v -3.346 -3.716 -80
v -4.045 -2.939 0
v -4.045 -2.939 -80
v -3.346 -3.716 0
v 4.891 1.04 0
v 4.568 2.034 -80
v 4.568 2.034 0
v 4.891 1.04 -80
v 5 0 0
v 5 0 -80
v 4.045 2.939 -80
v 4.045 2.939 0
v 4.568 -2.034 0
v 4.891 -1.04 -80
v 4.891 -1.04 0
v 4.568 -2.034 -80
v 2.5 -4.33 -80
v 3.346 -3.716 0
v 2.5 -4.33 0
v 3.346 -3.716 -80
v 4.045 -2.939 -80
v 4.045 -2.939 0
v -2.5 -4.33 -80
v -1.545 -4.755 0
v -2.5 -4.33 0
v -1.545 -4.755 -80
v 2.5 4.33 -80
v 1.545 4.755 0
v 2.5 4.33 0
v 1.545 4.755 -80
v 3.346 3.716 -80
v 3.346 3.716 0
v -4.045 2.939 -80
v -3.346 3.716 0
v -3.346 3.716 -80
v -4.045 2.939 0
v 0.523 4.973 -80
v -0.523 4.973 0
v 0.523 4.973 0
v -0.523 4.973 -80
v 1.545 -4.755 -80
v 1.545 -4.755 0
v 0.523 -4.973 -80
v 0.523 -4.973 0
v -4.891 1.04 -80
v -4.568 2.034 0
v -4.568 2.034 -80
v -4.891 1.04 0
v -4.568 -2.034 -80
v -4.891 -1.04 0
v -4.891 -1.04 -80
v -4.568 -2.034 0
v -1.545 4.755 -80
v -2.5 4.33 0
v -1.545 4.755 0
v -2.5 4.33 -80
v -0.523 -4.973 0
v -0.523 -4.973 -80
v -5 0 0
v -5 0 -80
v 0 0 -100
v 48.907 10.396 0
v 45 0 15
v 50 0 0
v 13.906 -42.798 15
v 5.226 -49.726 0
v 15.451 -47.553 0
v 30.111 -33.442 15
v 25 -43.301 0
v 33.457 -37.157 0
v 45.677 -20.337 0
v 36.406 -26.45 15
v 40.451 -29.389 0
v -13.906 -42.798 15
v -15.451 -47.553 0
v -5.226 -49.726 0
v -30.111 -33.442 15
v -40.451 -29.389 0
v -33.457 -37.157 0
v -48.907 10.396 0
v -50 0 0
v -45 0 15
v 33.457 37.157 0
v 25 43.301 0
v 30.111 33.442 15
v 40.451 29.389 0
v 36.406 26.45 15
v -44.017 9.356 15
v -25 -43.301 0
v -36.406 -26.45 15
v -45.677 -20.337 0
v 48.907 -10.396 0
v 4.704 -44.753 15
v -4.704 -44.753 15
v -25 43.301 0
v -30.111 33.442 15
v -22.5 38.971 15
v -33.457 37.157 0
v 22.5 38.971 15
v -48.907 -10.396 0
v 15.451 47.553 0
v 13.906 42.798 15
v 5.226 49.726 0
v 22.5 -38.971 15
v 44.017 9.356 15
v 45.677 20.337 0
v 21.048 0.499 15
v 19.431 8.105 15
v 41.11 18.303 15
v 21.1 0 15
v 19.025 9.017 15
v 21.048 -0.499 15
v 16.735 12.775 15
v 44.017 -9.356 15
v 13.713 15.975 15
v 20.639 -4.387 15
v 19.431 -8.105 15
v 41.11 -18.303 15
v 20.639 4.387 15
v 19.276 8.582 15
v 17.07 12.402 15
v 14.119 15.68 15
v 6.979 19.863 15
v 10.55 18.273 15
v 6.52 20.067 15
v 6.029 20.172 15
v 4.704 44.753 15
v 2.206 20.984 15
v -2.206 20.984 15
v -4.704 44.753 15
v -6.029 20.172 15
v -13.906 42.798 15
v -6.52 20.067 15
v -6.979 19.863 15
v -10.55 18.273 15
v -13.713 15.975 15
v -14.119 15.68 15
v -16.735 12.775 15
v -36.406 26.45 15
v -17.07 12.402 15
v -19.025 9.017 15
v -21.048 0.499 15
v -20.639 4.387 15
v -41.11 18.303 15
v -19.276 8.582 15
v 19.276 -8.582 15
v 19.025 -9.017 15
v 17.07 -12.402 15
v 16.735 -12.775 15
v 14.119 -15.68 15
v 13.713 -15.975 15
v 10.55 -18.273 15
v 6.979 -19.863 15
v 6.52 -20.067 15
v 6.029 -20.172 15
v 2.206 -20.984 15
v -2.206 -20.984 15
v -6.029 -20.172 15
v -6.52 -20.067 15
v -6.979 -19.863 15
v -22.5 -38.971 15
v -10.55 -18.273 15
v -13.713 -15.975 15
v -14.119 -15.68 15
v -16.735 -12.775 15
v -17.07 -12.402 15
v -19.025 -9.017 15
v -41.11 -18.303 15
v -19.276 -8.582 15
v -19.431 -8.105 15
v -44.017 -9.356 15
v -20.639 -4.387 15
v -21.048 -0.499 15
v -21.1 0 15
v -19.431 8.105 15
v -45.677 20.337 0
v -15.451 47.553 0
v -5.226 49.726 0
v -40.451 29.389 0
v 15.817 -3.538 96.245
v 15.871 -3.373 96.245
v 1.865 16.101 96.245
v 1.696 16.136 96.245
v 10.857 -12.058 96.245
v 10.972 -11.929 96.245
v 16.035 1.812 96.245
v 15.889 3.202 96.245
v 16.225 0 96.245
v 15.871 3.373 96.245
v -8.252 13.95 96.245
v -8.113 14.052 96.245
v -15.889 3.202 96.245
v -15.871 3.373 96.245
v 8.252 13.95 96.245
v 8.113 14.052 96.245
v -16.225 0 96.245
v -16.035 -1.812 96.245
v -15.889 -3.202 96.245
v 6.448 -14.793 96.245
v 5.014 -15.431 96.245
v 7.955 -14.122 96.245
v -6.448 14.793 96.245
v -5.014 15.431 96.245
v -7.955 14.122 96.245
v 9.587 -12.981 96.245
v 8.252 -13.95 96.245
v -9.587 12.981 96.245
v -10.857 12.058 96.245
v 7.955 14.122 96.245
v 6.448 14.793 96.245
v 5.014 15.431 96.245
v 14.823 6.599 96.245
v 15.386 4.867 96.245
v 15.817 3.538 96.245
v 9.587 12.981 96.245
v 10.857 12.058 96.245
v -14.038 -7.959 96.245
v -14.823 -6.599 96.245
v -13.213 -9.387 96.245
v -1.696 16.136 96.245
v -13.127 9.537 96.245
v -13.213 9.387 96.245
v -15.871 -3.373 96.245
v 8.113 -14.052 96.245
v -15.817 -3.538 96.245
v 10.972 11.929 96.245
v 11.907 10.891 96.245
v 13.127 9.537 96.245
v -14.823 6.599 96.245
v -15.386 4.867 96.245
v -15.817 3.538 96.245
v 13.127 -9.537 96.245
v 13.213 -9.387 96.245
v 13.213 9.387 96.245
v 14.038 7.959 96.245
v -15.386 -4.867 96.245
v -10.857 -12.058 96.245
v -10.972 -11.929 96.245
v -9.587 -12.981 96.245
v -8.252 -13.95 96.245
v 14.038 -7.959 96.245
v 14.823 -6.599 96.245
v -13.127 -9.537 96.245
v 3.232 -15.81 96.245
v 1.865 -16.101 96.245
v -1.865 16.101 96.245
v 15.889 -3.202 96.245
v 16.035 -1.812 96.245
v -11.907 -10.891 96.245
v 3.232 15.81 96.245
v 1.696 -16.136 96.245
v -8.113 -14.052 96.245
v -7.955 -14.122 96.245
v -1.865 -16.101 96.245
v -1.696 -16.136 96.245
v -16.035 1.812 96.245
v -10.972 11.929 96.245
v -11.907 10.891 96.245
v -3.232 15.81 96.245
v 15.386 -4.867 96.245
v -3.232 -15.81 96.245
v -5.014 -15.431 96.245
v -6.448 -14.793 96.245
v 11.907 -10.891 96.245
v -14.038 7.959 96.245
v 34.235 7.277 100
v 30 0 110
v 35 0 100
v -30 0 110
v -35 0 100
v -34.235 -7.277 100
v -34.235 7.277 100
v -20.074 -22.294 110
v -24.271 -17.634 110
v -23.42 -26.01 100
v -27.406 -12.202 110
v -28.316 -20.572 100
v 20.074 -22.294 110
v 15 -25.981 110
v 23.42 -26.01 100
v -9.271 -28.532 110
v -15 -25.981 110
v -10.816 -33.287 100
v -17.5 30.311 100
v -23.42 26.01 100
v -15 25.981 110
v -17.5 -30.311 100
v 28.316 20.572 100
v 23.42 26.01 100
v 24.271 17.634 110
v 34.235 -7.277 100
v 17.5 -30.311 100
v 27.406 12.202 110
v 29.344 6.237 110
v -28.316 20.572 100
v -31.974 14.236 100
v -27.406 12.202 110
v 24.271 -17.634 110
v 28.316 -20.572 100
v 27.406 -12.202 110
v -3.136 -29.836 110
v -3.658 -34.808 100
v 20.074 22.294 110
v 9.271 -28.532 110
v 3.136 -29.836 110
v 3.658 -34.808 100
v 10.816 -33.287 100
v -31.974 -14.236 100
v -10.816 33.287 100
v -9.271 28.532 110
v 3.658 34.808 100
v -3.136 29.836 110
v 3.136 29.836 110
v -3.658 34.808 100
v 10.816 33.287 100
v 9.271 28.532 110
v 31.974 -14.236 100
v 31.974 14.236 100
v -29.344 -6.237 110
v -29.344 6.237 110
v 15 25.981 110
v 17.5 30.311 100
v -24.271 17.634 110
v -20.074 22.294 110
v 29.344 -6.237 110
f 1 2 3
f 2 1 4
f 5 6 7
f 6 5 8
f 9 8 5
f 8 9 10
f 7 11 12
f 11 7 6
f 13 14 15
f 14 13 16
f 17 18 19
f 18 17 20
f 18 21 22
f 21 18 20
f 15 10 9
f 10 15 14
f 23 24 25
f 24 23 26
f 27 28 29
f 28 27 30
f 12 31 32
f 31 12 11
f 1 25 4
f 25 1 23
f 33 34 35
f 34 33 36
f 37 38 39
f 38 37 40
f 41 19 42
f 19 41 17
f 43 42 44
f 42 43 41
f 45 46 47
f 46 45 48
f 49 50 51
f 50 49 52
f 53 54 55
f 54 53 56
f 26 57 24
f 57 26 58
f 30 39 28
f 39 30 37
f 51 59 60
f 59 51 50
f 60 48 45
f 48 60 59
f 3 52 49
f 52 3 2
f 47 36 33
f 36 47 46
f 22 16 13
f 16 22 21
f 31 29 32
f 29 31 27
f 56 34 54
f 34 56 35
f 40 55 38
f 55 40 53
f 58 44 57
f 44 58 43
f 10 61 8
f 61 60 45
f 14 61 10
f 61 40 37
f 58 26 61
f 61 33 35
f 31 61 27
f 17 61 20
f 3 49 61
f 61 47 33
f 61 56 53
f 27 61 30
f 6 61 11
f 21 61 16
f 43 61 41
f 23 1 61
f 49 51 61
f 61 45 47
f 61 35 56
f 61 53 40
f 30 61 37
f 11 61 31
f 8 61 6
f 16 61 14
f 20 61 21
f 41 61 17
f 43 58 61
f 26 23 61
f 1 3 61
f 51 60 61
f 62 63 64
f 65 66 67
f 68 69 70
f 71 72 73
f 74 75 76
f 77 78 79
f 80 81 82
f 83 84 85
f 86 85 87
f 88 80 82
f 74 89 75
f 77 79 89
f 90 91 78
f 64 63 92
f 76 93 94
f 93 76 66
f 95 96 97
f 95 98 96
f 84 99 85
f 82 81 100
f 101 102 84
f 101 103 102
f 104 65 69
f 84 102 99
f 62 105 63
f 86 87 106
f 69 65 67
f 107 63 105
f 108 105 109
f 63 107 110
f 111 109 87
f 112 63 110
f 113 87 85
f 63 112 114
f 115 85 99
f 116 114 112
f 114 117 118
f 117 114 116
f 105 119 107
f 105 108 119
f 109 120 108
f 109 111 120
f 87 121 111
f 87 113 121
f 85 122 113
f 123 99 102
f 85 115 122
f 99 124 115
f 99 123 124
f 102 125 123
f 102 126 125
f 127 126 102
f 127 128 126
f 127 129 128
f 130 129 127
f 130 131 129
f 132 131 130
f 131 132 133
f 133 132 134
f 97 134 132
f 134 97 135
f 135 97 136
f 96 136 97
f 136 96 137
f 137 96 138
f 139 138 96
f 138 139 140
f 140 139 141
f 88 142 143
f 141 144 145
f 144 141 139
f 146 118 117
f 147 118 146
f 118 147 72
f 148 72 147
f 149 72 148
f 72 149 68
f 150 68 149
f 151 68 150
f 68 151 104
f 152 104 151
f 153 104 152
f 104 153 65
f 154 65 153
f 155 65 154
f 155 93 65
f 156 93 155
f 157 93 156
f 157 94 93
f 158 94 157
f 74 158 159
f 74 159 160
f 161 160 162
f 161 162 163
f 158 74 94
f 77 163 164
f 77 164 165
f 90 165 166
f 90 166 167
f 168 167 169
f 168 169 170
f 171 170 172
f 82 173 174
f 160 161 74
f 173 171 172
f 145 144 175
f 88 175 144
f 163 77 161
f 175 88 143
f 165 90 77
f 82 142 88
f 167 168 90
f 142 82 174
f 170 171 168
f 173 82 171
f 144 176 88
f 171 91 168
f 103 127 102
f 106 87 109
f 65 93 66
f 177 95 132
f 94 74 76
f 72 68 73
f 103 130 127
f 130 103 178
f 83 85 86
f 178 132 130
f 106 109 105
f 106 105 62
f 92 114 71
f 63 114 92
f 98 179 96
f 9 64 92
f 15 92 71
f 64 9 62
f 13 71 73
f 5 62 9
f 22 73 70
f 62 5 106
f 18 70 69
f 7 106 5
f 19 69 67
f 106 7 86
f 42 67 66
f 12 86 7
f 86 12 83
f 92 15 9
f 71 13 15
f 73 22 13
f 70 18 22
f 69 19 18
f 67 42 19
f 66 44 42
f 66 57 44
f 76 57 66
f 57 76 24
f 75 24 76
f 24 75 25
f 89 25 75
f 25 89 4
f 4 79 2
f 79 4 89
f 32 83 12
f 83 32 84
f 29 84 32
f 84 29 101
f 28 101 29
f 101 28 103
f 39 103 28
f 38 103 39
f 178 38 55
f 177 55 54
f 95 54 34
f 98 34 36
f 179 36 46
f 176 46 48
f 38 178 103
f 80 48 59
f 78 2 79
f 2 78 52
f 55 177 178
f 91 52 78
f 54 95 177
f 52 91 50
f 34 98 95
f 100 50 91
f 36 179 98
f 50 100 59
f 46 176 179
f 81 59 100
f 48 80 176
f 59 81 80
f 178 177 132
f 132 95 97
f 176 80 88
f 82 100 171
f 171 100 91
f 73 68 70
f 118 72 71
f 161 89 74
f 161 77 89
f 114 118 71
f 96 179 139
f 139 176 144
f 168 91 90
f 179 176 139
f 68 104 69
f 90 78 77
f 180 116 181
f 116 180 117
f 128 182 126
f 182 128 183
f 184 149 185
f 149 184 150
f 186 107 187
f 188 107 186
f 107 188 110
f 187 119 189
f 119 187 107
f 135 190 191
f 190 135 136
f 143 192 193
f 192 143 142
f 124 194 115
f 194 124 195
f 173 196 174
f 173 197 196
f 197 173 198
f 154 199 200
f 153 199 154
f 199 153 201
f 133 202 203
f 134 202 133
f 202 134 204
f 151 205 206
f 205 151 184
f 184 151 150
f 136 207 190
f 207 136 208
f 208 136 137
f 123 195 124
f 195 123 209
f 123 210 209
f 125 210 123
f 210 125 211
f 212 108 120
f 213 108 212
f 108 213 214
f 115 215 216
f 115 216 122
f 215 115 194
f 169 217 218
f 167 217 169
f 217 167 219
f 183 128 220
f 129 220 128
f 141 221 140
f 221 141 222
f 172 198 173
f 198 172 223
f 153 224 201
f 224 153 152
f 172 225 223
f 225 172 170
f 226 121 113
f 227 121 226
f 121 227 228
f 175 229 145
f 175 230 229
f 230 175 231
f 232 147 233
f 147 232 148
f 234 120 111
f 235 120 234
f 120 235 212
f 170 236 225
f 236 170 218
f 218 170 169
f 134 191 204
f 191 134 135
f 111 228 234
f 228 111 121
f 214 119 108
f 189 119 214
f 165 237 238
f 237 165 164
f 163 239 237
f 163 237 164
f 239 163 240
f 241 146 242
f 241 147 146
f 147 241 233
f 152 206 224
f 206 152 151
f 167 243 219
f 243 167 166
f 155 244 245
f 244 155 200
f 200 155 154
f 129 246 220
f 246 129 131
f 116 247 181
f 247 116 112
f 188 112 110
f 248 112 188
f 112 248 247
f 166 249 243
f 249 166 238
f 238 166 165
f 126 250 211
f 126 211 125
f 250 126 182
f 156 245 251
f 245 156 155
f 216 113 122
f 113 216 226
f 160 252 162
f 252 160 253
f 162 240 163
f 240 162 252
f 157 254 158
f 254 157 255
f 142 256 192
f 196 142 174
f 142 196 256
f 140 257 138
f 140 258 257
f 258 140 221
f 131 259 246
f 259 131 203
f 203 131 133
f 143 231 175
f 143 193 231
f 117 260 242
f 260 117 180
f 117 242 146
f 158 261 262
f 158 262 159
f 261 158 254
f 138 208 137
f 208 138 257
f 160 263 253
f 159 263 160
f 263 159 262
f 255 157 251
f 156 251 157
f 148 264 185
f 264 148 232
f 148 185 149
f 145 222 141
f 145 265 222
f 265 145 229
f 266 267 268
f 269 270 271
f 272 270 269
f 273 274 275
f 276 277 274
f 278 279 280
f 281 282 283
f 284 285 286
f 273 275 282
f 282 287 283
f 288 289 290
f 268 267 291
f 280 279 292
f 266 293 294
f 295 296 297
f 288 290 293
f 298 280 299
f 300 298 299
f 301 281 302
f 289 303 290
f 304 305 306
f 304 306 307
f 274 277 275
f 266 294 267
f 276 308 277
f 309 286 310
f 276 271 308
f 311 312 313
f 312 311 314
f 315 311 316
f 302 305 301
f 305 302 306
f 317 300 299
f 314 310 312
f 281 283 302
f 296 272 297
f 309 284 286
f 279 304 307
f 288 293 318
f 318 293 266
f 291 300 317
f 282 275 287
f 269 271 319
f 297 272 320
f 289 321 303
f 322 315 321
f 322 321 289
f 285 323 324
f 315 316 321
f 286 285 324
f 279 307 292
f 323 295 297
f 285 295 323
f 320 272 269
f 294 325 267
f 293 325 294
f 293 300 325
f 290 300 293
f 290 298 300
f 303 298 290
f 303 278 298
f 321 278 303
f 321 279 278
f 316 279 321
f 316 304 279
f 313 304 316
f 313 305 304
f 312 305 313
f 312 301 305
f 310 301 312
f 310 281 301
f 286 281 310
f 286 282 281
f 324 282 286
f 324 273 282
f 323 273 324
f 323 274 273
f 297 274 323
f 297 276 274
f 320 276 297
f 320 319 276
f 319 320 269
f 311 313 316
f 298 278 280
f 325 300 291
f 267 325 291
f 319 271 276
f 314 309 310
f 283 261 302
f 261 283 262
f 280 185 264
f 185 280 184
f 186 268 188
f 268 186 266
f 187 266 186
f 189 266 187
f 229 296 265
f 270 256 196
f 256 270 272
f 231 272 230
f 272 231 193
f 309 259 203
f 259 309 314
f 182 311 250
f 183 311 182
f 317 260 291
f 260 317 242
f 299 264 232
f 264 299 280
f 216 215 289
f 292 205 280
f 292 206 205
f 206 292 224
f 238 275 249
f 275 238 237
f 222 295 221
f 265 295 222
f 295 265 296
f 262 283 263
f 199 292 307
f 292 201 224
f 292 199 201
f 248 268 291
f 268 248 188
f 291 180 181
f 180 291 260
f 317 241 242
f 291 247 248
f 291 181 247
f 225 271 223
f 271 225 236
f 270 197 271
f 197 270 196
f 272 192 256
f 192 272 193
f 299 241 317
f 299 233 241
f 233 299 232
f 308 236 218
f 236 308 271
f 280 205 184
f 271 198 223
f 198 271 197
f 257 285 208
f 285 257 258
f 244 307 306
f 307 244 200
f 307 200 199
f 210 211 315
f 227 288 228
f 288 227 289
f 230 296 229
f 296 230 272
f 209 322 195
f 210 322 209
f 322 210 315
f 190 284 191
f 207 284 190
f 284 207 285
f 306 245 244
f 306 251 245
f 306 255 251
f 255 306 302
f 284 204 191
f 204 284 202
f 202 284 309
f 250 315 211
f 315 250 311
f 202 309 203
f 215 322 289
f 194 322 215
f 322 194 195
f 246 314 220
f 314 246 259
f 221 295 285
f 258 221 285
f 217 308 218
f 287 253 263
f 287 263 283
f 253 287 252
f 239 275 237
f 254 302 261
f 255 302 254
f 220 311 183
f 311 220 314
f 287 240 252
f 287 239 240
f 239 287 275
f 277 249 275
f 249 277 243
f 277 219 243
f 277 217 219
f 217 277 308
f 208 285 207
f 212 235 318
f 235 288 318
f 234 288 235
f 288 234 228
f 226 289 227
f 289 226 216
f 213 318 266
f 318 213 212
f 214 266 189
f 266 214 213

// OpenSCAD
scale(.5)
union(){
translate([0,0,-160]) 
    cylinder(200,10,10);
translate([0,0,-200]) 
    cylinder(40,0,10);

translate([0,0,0]) 
    cylinder(30,100,90);
translate([0,0,0]) 
    cylinder(200,44,32);

translate([0,0,200]) 
    cylinder(20,70,60);
translate([0,0,190]) 
    cylinder(10,20,70);
};
